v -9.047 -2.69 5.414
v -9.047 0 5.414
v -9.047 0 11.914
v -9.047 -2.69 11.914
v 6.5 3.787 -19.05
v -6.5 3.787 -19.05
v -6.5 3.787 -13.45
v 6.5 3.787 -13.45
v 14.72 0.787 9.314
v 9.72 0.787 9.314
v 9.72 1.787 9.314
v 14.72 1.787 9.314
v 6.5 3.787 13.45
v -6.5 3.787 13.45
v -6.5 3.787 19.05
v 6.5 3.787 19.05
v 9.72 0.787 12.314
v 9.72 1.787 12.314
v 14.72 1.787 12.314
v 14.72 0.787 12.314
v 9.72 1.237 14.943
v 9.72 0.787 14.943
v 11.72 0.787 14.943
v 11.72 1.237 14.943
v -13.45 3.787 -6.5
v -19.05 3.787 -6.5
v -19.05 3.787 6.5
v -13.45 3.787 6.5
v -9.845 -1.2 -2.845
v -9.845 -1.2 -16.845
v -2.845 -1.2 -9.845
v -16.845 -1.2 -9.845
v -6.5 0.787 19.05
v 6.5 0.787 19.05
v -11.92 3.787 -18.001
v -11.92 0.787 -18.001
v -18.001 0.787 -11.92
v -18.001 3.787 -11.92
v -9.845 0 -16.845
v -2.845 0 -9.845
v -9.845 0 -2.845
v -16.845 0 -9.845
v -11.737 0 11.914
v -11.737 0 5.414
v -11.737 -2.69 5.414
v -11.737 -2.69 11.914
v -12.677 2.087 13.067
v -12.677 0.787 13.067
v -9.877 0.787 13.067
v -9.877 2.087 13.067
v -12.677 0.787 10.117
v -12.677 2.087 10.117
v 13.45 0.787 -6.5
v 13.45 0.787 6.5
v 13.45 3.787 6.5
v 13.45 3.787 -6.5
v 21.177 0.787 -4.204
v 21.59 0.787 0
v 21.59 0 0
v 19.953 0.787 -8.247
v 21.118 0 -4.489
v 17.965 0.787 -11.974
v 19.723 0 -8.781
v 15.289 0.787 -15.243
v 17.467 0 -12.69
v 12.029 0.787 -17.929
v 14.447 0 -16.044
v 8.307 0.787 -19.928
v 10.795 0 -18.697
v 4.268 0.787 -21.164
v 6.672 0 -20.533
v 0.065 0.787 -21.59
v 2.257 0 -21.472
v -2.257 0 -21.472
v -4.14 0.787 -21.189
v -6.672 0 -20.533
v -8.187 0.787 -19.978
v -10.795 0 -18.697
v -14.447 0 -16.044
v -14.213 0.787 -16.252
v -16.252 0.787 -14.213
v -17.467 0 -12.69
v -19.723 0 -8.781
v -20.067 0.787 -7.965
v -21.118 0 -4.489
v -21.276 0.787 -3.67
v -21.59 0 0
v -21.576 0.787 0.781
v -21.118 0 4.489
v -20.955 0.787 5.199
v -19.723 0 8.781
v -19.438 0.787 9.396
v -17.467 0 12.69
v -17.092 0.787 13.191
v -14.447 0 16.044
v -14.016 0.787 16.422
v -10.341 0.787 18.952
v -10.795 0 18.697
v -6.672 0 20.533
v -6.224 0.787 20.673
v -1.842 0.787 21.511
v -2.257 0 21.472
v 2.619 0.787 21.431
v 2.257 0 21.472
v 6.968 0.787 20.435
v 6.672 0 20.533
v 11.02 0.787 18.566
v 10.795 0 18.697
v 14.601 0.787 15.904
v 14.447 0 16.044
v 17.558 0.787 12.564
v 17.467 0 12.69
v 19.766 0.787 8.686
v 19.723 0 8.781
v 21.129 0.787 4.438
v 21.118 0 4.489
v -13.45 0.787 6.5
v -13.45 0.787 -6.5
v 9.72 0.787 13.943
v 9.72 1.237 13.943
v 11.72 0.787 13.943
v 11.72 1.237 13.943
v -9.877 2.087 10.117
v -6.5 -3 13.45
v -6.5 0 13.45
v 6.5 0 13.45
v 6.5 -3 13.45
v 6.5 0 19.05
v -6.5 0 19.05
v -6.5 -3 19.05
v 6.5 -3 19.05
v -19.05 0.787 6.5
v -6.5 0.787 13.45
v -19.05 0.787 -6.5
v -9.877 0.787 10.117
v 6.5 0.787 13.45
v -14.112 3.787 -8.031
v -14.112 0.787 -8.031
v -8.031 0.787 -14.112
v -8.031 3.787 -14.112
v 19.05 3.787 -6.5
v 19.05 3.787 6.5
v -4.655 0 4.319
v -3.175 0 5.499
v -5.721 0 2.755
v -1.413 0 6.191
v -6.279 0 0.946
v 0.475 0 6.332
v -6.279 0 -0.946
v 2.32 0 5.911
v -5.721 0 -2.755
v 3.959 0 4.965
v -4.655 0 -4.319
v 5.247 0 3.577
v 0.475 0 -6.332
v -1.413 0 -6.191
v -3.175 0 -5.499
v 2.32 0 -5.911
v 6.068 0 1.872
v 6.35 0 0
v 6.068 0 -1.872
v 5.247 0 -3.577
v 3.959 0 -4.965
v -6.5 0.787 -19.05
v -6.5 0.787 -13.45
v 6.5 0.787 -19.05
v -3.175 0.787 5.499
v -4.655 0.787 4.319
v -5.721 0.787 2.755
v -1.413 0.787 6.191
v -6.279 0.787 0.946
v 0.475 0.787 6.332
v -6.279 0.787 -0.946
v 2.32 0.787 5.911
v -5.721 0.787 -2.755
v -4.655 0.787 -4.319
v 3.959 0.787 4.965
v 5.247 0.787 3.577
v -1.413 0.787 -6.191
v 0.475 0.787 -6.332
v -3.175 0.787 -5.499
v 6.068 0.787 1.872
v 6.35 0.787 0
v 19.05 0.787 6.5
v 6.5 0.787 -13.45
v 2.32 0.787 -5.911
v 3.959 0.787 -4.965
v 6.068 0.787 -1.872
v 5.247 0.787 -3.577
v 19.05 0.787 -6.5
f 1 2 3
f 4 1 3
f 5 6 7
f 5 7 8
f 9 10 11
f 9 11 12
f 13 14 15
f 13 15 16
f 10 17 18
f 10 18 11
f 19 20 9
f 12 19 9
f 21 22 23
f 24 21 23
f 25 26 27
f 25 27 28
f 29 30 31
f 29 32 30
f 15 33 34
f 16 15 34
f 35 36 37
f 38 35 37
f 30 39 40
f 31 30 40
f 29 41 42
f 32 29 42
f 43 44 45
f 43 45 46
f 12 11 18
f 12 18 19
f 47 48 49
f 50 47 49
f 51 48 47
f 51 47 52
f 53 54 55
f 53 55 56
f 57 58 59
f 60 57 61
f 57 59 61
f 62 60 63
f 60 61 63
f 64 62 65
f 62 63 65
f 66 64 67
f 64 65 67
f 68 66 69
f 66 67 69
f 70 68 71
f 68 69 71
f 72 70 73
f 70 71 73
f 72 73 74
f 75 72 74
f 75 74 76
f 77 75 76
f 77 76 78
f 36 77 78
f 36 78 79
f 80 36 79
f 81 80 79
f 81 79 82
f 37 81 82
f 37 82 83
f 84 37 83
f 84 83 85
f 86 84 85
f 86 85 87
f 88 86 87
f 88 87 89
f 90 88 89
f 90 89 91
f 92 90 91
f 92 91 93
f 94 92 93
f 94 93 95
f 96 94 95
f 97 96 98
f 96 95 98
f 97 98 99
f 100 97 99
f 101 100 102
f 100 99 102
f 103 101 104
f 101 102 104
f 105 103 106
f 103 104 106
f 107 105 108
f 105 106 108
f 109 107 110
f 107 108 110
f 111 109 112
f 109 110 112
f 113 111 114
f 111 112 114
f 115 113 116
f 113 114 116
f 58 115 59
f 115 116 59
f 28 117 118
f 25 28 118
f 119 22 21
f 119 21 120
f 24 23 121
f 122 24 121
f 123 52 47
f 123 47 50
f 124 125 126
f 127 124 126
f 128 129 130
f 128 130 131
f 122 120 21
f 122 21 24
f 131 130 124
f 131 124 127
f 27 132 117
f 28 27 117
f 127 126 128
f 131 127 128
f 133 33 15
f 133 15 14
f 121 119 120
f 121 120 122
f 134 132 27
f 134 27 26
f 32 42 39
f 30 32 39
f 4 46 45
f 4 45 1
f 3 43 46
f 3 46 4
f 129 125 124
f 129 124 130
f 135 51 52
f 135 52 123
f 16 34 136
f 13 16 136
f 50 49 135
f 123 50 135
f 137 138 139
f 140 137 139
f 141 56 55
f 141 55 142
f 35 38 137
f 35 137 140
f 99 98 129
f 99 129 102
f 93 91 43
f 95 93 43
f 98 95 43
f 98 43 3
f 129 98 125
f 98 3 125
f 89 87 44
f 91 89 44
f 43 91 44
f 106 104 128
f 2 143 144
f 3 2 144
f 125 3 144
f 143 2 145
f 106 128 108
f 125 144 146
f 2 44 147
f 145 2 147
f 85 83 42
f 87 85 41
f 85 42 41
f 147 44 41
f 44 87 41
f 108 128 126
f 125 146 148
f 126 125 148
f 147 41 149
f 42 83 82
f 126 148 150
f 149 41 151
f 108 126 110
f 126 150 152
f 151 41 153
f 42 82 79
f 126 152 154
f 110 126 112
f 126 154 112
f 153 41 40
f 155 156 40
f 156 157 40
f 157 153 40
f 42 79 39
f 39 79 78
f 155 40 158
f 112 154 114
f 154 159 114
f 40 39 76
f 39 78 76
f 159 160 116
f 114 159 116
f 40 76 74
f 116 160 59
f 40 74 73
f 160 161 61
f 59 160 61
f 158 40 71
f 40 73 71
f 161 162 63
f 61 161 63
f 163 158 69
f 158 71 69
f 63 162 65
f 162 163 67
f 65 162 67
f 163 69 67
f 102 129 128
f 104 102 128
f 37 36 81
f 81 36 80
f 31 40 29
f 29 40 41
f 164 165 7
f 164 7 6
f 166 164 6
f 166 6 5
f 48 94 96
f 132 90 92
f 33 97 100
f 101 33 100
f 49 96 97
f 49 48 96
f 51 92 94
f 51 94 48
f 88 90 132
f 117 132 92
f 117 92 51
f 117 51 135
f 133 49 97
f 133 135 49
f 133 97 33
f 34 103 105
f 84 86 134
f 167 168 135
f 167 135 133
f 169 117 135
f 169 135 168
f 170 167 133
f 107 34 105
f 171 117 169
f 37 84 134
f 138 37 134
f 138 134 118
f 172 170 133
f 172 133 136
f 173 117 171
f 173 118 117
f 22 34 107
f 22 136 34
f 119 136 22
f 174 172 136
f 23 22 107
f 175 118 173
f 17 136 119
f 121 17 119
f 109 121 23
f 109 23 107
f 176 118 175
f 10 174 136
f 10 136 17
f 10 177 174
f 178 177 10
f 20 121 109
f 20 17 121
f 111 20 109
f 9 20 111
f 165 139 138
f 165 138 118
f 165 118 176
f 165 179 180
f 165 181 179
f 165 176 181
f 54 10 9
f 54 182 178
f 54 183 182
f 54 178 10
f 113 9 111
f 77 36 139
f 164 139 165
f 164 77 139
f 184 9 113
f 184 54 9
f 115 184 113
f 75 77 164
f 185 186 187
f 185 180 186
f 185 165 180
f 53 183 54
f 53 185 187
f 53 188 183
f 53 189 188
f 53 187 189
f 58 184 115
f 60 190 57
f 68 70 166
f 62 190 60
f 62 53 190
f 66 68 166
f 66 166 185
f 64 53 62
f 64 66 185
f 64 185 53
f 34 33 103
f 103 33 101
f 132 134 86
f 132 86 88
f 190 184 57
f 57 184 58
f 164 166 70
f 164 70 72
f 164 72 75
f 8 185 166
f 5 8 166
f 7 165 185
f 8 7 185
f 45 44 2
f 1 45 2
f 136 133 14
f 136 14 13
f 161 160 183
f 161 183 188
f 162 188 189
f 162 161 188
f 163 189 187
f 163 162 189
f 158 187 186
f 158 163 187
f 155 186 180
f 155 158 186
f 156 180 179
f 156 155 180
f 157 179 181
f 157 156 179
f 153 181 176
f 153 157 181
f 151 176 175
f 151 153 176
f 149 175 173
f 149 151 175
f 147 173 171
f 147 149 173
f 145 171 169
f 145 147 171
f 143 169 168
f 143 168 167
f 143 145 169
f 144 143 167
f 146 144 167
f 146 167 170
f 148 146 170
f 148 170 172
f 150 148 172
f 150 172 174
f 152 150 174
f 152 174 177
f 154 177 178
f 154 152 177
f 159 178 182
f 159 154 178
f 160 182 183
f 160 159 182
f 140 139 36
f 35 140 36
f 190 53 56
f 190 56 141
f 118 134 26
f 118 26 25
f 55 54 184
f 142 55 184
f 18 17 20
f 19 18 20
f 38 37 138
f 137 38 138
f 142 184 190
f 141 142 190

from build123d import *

# Parameters (mm, degrees)
SKETCH1_R                         = 21.59
SKETCH1_R_2                       = 6.35
BOSS_EXTRUDE1_DEPTH               = 0.7874
SKETCH2_W                         = 5.6
SKETCH2_H                         = 13
SKETCH2_W_2                       = 13
SKETCH2_H_2                       = 5.6
FACE_BOARD_CONNECTORS_DEPTH       = 3
SKETCH3_W                         = 13
SKETCH3_H                         = 5.6
BOTTOM_FACE_BOARD_CONNECTOR_DEPTH = 3
PROGRAMMING_CONNECTOR_DEPTH       = 3
SKETCH5_W                         = 2.8
SKETCH5_H                         = 2.95
I2C_TRANSLATOR_DEPTH              = 1.3
SKETCH6_W                         = 5
SKETCH6_H                         = 3
ACCELEROMETER_DEPTH               = 1
SKETCH7_W                         = 2
SKETCH7_H                         = 1
BOSS_EXTRUDE7_DEPTH               = 0.45
BOSS_EXTRUDE8_DEPTH               = 1.2
SKETCH9_W                         = 2.69
SKETCH9_H                         = 6.5
BOSS_EXTRUDE9_DEPTH               = 2.69


with BuildPart() as part:
    # Sketch1 → Boss-Extrude1 (new body)
    with BuildSketch(Plane(origin=(0, 0, 0), x_dir=(1, 0, 0), z_dir=(0, 1, 0))):
        Circle(SKETCH1_R)
        Circle(SKETCH1_R_2, mode=Mode.SUBTRACT)
    extrude(amount=BOSS_EXTRUDE1_DEPTH)

    # Sketch2 → Face Board Connectors (add)
    with BuildSketch(Plane(origin=(0, 0.7874, 0), x_dir=(1, 0, 0), z_dir=(0, 1, 0))):
        with Locations((-16.25, 0)):
            Rectangle(SKETCH2_W, SKETCH2_H)
        with Locations((0, 16.25)):
            Rectangle(SKETCH2_W_2, SKETCH2_H_2)
        with Locations((0, -16.25)):
            Rectangle(SKETCH2_W_2, SKETCH2_H_2)
        with Locations((16.25, 0)):
            Rectangle(SKETCH2_W, SKETCH2_H)
    extrude(amount=FACE_BOARD_CONNECTORS_DEPTH)

    # Sketch3 → Bottom Face Board Connector (add)
    with BuildSketch(Plane.XZ):
        with Locations((0, 16.25)):
            Rectangle(SKETCH3_W, SKETCH3_H)
    extrude(amount=BOTTOM_FACE_BOARD_CONNECTOR_DEPTH)

    # Sketch4 → Programming Connector (add)
    with BuildSketch(Plane(origin=(0, 0.7874, 0), x_dir=(1, 0, 0), z_dir=(0, 1, 0))):
        Polygon((-18.00114237, 11.920024051), (-14.112055073, 8.030936755), (-8.030936755, 14.112055073), (-11.920024051, 18.00114237), align=None)
    extrude(amount=PROGRAMMING_CONNECTOR_DEPTH)

    # Sketch5 → I2C Translator (add)
    with BuildSketch(Plane(origin=(0, 0.7874, 0), x_dir=(1, 0, 0), z_dir=(0, 1, 0))):
        with Locations((-11.276551559, -11.592117418)):
            Rectangle(SKETCH5_W, SKETCH5_H)
    extrude(amount=I2C_TRANSLATOR_DEPTH)

    # Sketch6 → Accelerometer (add)
    with BuildSketch(Plane(origin=(0, 0.7874, 0), x_dir=(1, 0, 0), z_dir=(0, 1, 0))):
        with Locations((12.21999094, -10.814372721)):
            Rectangle(SKETCH6_W, SKETCH6_H)
    extrude(amount=ACCELEROMETER_DEPTH)

    # Sketch7 → Boss-Extrude7 (add)
    with BuildSketch(Plane(origin=(0, 0.7874, 0), x_dir=(1, 0, 0), z_dir=(0, 1, 0))):
        with Locations((10.71999094, -14.443290742)):
            Rectangle(SKETCH7_W, SKETCH7_H)
    extrude(amount=BOSS_EXTRUDE7_DEPTH)

    # Sketch8 → Boss-Extrude8 (add)
    with BuildSketch(Plane.XZ):
        Polygon((-9.844993145, -16.845350279), (-2.844636011, -9.844993145), (-9.844993145, -2.844636011), (-16.845350279, -9.844993145), align=None)
    extrude(amount=BOSS_EXTRUDE8_DEPTH)

    # Sketch9 → Boss-Extrude9 (add)
    with BuildSketch(Plane.XZ):
        with Locations((-10.391917908, 8.664203432)):
            Rectangle(SKETCH9_W, SKETCH9_H)
    extrude(amount=BOSS_EXTRUDE9_DEPTH)


solid = part.part
